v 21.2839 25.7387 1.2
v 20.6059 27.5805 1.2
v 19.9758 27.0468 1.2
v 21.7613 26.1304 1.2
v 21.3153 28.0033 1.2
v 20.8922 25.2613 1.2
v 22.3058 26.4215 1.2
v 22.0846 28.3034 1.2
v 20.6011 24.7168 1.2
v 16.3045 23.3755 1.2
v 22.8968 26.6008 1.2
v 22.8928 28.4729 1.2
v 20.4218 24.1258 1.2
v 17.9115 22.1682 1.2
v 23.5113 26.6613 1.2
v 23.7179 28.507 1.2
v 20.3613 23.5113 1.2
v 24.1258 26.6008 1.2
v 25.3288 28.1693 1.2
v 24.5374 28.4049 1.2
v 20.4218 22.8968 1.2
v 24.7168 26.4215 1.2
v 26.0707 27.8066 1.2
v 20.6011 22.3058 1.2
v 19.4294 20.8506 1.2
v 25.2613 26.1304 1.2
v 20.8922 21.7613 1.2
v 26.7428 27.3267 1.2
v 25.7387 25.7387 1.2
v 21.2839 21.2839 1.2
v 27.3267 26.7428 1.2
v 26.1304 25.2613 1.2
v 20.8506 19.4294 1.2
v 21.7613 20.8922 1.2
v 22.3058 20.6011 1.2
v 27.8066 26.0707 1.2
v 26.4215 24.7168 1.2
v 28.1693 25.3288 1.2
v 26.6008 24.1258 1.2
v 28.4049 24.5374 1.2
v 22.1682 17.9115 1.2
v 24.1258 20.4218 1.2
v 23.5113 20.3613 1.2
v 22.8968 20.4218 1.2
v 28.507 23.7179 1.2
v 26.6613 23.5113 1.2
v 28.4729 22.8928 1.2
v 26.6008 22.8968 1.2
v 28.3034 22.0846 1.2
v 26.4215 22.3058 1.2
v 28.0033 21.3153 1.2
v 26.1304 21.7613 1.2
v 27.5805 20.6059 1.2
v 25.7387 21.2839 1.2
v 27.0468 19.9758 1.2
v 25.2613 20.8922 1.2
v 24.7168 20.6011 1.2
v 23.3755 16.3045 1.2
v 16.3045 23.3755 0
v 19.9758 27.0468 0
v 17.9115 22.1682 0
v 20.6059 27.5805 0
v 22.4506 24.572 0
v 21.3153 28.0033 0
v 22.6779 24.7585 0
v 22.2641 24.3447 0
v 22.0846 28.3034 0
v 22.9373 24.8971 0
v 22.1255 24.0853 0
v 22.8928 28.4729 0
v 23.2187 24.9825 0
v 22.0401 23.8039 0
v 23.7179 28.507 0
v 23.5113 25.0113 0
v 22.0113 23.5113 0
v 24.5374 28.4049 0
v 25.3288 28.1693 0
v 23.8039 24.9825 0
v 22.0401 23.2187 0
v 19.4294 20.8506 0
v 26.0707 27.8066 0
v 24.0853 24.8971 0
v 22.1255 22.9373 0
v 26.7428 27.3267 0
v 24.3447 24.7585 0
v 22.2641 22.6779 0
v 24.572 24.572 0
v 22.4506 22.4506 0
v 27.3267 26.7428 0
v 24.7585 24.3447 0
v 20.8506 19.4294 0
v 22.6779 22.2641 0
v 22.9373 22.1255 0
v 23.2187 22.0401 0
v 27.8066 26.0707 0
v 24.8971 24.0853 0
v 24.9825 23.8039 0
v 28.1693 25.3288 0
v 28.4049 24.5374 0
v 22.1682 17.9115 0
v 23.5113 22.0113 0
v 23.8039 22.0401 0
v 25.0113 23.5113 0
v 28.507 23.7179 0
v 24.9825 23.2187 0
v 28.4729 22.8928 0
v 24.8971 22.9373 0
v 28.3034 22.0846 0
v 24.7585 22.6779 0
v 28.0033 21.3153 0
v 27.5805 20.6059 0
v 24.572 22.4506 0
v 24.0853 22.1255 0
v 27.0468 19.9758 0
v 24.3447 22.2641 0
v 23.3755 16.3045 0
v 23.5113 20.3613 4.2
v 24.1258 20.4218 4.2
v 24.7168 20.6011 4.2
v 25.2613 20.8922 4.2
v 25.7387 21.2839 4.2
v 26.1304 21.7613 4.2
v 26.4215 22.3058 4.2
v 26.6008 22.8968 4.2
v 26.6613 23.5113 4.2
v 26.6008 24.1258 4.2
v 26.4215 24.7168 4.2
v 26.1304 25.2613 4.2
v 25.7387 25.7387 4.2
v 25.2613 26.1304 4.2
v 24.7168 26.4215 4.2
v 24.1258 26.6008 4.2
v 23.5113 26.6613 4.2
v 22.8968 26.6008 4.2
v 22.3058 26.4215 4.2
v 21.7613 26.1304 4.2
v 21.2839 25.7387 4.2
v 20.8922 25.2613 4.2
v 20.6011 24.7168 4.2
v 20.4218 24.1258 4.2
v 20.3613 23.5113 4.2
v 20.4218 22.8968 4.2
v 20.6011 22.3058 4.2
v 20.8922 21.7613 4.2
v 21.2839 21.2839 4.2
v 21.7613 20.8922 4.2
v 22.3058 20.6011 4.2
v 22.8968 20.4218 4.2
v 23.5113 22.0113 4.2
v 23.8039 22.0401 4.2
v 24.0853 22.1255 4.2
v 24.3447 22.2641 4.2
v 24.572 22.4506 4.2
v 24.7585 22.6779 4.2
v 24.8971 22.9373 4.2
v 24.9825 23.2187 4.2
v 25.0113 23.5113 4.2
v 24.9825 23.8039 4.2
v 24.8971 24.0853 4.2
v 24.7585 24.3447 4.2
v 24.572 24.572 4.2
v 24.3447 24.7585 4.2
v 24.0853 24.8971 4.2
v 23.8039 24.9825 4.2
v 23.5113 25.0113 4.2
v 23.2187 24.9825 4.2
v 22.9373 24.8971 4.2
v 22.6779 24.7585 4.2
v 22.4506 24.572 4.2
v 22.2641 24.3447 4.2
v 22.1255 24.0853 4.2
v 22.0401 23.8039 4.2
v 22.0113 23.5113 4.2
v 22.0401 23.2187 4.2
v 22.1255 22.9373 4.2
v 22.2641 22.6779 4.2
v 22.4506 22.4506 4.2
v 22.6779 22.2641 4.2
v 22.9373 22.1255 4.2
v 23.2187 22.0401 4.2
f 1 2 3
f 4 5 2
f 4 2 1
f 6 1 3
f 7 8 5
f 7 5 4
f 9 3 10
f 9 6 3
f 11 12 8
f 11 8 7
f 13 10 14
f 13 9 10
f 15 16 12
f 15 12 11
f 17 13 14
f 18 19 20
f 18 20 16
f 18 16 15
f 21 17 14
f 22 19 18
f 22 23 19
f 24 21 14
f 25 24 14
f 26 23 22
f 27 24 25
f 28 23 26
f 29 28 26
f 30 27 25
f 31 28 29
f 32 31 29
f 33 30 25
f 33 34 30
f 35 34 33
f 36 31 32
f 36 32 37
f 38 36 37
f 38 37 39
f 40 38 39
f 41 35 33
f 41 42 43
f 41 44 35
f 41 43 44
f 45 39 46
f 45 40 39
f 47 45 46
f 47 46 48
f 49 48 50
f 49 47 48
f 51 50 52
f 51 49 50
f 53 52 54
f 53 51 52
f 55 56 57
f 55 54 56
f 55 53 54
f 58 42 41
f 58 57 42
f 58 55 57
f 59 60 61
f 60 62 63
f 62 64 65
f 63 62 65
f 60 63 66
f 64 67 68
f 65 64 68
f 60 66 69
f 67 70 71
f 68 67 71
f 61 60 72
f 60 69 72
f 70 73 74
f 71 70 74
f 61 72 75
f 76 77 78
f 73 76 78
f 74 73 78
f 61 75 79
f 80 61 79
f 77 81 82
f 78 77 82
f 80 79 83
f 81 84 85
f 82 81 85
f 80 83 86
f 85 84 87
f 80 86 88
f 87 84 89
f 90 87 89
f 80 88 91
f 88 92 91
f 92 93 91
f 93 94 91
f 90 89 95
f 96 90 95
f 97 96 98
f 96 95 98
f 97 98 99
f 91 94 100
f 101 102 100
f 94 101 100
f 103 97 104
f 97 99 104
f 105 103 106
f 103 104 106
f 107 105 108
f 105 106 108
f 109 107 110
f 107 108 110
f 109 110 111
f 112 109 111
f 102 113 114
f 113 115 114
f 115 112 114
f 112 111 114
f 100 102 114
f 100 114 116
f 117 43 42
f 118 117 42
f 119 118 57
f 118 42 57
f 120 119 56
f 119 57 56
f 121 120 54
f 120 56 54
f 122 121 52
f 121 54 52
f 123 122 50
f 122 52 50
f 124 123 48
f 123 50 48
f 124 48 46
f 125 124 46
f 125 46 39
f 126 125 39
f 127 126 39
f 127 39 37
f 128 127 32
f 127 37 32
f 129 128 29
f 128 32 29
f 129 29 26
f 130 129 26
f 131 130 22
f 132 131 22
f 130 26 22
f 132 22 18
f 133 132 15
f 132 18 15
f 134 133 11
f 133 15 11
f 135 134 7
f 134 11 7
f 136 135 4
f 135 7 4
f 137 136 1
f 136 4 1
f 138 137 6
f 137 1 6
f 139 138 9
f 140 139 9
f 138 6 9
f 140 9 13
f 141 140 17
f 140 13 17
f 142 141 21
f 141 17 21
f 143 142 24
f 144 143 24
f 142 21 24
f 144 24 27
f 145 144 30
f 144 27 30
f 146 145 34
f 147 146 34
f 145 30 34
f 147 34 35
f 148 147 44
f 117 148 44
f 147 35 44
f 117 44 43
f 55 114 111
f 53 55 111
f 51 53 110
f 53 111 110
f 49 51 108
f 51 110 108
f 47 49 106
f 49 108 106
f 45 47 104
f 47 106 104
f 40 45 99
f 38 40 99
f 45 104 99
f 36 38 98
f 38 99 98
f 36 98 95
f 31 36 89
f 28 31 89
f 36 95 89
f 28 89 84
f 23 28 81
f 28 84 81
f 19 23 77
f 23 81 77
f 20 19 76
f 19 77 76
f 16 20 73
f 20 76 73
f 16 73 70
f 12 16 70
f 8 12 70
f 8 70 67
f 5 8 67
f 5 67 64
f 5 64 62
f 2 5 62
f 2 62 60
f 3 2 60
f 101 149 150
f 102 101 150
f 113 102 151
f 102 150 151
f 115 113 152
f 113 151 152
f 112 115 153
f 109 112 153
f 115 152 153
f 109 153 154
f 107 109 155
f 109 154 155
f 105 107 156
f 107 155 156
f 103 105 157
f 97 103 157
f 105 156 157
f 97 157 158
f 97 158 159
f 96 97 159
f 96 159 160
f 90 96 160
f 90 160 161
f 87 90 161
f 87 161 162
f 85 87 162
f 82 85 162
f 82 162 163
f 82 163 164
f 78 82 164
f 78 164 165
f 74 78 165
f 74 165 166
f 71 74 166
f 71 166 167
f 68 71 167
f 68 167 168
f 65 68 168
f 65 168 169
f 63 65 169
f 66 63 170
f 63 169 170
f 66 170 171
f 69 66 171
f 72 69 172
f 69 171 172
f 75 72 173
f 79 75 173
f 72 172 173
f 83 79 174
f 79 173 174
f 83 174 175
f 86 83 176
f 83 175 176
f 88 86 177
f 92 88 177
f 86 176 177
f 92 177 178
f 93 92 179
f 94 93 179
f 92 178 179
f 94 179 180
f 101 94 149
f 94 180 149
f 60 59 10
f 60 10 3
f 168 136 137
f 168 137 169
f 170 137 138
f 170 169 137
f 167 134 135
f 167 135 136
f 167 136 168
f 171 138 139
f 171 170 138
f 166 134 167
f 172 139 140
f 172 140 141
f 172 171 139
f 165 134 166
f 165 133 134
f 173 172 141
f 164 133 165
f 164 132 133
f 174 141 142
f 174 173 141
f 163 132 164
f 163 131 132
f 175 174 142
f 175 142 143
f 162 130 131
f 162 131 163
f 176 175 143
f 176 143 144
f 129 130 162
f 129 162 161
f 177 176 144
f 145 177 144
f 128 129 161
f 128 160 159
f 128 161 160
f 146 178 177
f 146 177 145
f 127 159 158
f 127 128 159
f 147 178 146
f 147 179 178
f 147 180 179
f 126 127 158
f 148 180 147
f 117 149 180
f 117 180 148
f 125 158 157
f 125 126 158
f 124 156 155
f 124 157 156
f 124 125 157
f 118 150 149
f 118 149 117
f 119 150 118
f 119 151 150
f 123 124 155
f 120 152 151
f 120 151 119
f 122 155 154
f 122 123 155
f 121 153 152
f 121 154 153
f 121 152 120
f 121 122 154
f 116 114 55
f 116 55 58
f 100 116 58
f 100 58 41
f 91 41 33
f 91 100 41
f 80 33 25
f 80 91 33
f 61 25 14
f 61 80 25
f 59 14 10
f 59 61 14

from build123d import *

# Parameters (mm, degrees)
PAD_DEPTH                = 1.2
SKETCH001_R              = 3.15
PAD001_DEPTH             = 3
SKETCH002_R              = 0.8
POCKET_DEPTH             = 4.201
SKETCH003_R              = 1.5
POCKET001_DEPTH          = 5
CLONE002_PLACEMENT_ANGLE = -90


with BuildPart() as part:
    # Sketch → Pad (new body)
    with BuildSketch(Plane.XY):
        with BuildLine():
            ThreePointArc((-19.975767, 27.046834), (-27.046834, 27.046834), (-27.046834, 19.975767))
            Line((-23.375519, 16.304451), (-27.046834, 19.975767))
            ThreePointArc((-16.304451, 23.375519), (-20.152543, 20.152543), (-23.375519, 16.304451))
            Line((-19.975767, 27.046834), (-16.304451, 23.375519))
        make_face()
    extrude(amount=PAD_DEPTH)

    # Sketch001 → Pad001 (new body)
    with BuildSketch(Plane.XY.offset(1.2)):
        with Locations((-23.5113, 23.5113)):
            Circle(SKETCH001_R)
    extrude(amount=PAD001_DEPTH)

    # Sketch002 → Pocket (cut, through all)
    with BuildSketch(Plane.XY.offset(4.2)):
        with Locations((-23.5113, 23.5113)):
            Circle(SKETCH002_R)
    extrude(amount=-POCKET_DEPTH, mode=Mode.SUBTRACT)

    # Sketch003 → Pocket001 (cut)
    with BuildSketch(Plane.XY.offset(4.2)):
        with Locations((-23.5113, 23.5113)):
            Circle(SKETCH003_R)
    extrude(amount=-POCKET001_DEPTH, mode=Mode.SUBTRACT)


with BuildPart() as part_1:
    # Clone002 placement: moved
    add(part.part.rotate(Axis((0, 0, 0), (0, 0, 1)), CLONE002_PLACEMENT_ANGLE))


solid = part_1.part
